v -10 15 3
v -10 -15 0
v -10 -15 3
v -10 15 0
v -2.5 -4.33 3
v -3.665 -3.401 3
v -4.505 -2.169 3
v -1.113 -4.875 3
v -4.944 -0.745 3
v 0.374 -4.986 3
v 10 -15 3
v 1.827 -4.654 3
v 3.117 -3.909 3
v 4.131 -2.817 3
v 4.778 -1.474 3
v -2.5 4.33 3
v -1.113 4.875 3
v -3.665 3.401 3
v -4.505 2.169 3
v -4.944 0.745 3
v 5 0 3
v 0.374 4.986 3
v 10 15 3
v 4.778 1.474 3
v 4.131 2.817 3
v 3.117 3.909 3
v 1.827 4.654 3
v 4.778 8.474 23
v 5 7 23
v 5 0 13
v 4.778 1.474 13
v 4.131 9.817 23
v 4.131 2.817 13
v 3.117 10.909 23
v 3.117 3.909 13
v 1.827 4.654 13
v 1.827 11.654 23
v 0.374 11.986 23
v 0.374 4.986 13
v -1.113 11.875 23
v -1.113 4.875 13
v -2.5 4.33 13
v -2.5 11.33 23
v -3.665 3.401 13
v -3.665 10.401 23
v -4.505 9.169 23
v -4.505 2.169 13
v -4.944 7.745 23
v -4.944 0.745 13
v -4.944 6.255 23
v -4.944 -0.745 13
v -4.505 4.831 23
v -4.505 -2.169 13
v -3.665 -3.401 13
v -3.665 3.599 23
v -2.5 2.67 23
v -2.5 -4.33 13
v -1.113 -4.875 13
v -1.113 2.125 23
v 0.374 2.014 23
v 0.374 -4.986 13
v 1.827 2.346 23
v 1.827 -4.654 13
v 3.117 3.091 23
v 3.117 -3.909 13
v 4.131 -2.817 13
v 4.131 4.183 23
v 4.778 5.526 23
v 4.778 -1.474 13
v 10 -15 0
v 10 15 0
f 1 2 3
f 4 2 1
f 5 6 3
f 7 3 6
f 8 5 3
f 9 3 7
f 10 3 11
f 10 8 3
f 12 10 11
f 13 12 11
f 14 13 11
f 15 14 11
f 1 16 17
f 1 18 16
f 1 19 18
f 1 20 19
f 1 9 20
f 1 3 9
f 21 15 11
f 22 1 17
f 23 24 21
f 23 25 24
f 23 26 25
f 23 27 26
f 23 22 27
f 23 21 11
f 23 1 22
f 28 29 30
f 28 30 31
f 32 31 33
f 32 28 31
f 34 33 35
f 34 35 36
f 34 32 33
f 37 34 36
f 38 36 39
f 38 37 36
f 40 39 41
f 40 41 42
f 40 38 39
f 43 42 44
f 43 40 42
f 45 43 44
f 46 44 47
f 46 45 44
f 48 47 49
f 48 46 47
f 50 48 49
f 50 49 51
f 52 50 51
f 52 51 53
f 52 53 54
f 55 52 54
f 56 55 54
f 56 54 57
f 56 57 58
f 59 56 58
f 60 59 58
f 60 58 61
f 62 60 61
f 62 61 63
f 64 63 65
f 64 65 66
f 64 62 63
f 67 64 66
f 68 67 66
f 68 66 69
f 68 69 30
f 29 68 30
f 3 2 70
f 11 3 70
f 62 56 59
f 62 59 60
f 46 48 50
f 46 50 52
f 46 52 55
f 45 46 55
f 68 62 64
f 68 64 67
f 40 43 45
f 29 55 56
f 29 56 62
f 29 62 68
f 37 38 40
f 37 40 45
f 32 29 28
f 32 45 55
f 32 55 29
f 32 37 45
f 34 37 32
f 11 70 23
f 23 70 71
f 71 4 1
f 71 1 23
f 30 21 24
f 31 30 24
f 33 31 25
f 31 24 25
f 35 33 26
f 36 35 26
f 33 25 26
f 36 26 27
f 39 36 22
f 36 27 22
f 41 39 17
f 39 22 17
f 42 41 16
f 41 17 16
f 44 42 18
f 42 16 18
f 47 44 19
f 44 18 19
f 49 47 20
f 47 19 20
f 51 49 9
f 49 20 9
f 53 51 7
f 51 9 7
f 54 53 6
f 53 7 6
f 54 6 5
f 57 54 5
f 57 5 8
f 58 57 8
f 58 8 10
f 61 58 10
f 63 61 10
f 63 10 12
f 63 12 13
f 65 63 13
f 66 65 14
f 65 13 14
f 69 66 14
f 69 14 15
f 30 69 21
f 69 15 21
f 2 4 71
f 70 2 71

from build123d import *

# Parameters (mm, degrees)
F0_W     = 20
F0_H     = 30
F1_DEPTH = 3
F2_R     = 5
F3_DEPTH = 10
F6_R     = 5


with BuildPart() as f1:
    # F0 (on Top) → F1 (new body)
    with BuildSketch(Plane.XY):
        Rectangle(F0_W, F0_H)
    extrude(amount=F1_DEPTH)

    # F2 (on face) → F3 (join)
    with BuildSketch(Plane.XY.offset(3)):
        Circle(F2_R)
    extrude(amount=F3_DEPTH)

    # F9: sweep along a path in F8
    with BuildLine(Plane.YZ) as f9_path:
        Line((0, 13), (7, 23))
    # F6 (on face) → F9 (sweep)
    with BuildSketch(Plane.XY.offset(13)):
        Circle(F6_R)
    sweep(path=f9_path.line)


solid = f1.part
